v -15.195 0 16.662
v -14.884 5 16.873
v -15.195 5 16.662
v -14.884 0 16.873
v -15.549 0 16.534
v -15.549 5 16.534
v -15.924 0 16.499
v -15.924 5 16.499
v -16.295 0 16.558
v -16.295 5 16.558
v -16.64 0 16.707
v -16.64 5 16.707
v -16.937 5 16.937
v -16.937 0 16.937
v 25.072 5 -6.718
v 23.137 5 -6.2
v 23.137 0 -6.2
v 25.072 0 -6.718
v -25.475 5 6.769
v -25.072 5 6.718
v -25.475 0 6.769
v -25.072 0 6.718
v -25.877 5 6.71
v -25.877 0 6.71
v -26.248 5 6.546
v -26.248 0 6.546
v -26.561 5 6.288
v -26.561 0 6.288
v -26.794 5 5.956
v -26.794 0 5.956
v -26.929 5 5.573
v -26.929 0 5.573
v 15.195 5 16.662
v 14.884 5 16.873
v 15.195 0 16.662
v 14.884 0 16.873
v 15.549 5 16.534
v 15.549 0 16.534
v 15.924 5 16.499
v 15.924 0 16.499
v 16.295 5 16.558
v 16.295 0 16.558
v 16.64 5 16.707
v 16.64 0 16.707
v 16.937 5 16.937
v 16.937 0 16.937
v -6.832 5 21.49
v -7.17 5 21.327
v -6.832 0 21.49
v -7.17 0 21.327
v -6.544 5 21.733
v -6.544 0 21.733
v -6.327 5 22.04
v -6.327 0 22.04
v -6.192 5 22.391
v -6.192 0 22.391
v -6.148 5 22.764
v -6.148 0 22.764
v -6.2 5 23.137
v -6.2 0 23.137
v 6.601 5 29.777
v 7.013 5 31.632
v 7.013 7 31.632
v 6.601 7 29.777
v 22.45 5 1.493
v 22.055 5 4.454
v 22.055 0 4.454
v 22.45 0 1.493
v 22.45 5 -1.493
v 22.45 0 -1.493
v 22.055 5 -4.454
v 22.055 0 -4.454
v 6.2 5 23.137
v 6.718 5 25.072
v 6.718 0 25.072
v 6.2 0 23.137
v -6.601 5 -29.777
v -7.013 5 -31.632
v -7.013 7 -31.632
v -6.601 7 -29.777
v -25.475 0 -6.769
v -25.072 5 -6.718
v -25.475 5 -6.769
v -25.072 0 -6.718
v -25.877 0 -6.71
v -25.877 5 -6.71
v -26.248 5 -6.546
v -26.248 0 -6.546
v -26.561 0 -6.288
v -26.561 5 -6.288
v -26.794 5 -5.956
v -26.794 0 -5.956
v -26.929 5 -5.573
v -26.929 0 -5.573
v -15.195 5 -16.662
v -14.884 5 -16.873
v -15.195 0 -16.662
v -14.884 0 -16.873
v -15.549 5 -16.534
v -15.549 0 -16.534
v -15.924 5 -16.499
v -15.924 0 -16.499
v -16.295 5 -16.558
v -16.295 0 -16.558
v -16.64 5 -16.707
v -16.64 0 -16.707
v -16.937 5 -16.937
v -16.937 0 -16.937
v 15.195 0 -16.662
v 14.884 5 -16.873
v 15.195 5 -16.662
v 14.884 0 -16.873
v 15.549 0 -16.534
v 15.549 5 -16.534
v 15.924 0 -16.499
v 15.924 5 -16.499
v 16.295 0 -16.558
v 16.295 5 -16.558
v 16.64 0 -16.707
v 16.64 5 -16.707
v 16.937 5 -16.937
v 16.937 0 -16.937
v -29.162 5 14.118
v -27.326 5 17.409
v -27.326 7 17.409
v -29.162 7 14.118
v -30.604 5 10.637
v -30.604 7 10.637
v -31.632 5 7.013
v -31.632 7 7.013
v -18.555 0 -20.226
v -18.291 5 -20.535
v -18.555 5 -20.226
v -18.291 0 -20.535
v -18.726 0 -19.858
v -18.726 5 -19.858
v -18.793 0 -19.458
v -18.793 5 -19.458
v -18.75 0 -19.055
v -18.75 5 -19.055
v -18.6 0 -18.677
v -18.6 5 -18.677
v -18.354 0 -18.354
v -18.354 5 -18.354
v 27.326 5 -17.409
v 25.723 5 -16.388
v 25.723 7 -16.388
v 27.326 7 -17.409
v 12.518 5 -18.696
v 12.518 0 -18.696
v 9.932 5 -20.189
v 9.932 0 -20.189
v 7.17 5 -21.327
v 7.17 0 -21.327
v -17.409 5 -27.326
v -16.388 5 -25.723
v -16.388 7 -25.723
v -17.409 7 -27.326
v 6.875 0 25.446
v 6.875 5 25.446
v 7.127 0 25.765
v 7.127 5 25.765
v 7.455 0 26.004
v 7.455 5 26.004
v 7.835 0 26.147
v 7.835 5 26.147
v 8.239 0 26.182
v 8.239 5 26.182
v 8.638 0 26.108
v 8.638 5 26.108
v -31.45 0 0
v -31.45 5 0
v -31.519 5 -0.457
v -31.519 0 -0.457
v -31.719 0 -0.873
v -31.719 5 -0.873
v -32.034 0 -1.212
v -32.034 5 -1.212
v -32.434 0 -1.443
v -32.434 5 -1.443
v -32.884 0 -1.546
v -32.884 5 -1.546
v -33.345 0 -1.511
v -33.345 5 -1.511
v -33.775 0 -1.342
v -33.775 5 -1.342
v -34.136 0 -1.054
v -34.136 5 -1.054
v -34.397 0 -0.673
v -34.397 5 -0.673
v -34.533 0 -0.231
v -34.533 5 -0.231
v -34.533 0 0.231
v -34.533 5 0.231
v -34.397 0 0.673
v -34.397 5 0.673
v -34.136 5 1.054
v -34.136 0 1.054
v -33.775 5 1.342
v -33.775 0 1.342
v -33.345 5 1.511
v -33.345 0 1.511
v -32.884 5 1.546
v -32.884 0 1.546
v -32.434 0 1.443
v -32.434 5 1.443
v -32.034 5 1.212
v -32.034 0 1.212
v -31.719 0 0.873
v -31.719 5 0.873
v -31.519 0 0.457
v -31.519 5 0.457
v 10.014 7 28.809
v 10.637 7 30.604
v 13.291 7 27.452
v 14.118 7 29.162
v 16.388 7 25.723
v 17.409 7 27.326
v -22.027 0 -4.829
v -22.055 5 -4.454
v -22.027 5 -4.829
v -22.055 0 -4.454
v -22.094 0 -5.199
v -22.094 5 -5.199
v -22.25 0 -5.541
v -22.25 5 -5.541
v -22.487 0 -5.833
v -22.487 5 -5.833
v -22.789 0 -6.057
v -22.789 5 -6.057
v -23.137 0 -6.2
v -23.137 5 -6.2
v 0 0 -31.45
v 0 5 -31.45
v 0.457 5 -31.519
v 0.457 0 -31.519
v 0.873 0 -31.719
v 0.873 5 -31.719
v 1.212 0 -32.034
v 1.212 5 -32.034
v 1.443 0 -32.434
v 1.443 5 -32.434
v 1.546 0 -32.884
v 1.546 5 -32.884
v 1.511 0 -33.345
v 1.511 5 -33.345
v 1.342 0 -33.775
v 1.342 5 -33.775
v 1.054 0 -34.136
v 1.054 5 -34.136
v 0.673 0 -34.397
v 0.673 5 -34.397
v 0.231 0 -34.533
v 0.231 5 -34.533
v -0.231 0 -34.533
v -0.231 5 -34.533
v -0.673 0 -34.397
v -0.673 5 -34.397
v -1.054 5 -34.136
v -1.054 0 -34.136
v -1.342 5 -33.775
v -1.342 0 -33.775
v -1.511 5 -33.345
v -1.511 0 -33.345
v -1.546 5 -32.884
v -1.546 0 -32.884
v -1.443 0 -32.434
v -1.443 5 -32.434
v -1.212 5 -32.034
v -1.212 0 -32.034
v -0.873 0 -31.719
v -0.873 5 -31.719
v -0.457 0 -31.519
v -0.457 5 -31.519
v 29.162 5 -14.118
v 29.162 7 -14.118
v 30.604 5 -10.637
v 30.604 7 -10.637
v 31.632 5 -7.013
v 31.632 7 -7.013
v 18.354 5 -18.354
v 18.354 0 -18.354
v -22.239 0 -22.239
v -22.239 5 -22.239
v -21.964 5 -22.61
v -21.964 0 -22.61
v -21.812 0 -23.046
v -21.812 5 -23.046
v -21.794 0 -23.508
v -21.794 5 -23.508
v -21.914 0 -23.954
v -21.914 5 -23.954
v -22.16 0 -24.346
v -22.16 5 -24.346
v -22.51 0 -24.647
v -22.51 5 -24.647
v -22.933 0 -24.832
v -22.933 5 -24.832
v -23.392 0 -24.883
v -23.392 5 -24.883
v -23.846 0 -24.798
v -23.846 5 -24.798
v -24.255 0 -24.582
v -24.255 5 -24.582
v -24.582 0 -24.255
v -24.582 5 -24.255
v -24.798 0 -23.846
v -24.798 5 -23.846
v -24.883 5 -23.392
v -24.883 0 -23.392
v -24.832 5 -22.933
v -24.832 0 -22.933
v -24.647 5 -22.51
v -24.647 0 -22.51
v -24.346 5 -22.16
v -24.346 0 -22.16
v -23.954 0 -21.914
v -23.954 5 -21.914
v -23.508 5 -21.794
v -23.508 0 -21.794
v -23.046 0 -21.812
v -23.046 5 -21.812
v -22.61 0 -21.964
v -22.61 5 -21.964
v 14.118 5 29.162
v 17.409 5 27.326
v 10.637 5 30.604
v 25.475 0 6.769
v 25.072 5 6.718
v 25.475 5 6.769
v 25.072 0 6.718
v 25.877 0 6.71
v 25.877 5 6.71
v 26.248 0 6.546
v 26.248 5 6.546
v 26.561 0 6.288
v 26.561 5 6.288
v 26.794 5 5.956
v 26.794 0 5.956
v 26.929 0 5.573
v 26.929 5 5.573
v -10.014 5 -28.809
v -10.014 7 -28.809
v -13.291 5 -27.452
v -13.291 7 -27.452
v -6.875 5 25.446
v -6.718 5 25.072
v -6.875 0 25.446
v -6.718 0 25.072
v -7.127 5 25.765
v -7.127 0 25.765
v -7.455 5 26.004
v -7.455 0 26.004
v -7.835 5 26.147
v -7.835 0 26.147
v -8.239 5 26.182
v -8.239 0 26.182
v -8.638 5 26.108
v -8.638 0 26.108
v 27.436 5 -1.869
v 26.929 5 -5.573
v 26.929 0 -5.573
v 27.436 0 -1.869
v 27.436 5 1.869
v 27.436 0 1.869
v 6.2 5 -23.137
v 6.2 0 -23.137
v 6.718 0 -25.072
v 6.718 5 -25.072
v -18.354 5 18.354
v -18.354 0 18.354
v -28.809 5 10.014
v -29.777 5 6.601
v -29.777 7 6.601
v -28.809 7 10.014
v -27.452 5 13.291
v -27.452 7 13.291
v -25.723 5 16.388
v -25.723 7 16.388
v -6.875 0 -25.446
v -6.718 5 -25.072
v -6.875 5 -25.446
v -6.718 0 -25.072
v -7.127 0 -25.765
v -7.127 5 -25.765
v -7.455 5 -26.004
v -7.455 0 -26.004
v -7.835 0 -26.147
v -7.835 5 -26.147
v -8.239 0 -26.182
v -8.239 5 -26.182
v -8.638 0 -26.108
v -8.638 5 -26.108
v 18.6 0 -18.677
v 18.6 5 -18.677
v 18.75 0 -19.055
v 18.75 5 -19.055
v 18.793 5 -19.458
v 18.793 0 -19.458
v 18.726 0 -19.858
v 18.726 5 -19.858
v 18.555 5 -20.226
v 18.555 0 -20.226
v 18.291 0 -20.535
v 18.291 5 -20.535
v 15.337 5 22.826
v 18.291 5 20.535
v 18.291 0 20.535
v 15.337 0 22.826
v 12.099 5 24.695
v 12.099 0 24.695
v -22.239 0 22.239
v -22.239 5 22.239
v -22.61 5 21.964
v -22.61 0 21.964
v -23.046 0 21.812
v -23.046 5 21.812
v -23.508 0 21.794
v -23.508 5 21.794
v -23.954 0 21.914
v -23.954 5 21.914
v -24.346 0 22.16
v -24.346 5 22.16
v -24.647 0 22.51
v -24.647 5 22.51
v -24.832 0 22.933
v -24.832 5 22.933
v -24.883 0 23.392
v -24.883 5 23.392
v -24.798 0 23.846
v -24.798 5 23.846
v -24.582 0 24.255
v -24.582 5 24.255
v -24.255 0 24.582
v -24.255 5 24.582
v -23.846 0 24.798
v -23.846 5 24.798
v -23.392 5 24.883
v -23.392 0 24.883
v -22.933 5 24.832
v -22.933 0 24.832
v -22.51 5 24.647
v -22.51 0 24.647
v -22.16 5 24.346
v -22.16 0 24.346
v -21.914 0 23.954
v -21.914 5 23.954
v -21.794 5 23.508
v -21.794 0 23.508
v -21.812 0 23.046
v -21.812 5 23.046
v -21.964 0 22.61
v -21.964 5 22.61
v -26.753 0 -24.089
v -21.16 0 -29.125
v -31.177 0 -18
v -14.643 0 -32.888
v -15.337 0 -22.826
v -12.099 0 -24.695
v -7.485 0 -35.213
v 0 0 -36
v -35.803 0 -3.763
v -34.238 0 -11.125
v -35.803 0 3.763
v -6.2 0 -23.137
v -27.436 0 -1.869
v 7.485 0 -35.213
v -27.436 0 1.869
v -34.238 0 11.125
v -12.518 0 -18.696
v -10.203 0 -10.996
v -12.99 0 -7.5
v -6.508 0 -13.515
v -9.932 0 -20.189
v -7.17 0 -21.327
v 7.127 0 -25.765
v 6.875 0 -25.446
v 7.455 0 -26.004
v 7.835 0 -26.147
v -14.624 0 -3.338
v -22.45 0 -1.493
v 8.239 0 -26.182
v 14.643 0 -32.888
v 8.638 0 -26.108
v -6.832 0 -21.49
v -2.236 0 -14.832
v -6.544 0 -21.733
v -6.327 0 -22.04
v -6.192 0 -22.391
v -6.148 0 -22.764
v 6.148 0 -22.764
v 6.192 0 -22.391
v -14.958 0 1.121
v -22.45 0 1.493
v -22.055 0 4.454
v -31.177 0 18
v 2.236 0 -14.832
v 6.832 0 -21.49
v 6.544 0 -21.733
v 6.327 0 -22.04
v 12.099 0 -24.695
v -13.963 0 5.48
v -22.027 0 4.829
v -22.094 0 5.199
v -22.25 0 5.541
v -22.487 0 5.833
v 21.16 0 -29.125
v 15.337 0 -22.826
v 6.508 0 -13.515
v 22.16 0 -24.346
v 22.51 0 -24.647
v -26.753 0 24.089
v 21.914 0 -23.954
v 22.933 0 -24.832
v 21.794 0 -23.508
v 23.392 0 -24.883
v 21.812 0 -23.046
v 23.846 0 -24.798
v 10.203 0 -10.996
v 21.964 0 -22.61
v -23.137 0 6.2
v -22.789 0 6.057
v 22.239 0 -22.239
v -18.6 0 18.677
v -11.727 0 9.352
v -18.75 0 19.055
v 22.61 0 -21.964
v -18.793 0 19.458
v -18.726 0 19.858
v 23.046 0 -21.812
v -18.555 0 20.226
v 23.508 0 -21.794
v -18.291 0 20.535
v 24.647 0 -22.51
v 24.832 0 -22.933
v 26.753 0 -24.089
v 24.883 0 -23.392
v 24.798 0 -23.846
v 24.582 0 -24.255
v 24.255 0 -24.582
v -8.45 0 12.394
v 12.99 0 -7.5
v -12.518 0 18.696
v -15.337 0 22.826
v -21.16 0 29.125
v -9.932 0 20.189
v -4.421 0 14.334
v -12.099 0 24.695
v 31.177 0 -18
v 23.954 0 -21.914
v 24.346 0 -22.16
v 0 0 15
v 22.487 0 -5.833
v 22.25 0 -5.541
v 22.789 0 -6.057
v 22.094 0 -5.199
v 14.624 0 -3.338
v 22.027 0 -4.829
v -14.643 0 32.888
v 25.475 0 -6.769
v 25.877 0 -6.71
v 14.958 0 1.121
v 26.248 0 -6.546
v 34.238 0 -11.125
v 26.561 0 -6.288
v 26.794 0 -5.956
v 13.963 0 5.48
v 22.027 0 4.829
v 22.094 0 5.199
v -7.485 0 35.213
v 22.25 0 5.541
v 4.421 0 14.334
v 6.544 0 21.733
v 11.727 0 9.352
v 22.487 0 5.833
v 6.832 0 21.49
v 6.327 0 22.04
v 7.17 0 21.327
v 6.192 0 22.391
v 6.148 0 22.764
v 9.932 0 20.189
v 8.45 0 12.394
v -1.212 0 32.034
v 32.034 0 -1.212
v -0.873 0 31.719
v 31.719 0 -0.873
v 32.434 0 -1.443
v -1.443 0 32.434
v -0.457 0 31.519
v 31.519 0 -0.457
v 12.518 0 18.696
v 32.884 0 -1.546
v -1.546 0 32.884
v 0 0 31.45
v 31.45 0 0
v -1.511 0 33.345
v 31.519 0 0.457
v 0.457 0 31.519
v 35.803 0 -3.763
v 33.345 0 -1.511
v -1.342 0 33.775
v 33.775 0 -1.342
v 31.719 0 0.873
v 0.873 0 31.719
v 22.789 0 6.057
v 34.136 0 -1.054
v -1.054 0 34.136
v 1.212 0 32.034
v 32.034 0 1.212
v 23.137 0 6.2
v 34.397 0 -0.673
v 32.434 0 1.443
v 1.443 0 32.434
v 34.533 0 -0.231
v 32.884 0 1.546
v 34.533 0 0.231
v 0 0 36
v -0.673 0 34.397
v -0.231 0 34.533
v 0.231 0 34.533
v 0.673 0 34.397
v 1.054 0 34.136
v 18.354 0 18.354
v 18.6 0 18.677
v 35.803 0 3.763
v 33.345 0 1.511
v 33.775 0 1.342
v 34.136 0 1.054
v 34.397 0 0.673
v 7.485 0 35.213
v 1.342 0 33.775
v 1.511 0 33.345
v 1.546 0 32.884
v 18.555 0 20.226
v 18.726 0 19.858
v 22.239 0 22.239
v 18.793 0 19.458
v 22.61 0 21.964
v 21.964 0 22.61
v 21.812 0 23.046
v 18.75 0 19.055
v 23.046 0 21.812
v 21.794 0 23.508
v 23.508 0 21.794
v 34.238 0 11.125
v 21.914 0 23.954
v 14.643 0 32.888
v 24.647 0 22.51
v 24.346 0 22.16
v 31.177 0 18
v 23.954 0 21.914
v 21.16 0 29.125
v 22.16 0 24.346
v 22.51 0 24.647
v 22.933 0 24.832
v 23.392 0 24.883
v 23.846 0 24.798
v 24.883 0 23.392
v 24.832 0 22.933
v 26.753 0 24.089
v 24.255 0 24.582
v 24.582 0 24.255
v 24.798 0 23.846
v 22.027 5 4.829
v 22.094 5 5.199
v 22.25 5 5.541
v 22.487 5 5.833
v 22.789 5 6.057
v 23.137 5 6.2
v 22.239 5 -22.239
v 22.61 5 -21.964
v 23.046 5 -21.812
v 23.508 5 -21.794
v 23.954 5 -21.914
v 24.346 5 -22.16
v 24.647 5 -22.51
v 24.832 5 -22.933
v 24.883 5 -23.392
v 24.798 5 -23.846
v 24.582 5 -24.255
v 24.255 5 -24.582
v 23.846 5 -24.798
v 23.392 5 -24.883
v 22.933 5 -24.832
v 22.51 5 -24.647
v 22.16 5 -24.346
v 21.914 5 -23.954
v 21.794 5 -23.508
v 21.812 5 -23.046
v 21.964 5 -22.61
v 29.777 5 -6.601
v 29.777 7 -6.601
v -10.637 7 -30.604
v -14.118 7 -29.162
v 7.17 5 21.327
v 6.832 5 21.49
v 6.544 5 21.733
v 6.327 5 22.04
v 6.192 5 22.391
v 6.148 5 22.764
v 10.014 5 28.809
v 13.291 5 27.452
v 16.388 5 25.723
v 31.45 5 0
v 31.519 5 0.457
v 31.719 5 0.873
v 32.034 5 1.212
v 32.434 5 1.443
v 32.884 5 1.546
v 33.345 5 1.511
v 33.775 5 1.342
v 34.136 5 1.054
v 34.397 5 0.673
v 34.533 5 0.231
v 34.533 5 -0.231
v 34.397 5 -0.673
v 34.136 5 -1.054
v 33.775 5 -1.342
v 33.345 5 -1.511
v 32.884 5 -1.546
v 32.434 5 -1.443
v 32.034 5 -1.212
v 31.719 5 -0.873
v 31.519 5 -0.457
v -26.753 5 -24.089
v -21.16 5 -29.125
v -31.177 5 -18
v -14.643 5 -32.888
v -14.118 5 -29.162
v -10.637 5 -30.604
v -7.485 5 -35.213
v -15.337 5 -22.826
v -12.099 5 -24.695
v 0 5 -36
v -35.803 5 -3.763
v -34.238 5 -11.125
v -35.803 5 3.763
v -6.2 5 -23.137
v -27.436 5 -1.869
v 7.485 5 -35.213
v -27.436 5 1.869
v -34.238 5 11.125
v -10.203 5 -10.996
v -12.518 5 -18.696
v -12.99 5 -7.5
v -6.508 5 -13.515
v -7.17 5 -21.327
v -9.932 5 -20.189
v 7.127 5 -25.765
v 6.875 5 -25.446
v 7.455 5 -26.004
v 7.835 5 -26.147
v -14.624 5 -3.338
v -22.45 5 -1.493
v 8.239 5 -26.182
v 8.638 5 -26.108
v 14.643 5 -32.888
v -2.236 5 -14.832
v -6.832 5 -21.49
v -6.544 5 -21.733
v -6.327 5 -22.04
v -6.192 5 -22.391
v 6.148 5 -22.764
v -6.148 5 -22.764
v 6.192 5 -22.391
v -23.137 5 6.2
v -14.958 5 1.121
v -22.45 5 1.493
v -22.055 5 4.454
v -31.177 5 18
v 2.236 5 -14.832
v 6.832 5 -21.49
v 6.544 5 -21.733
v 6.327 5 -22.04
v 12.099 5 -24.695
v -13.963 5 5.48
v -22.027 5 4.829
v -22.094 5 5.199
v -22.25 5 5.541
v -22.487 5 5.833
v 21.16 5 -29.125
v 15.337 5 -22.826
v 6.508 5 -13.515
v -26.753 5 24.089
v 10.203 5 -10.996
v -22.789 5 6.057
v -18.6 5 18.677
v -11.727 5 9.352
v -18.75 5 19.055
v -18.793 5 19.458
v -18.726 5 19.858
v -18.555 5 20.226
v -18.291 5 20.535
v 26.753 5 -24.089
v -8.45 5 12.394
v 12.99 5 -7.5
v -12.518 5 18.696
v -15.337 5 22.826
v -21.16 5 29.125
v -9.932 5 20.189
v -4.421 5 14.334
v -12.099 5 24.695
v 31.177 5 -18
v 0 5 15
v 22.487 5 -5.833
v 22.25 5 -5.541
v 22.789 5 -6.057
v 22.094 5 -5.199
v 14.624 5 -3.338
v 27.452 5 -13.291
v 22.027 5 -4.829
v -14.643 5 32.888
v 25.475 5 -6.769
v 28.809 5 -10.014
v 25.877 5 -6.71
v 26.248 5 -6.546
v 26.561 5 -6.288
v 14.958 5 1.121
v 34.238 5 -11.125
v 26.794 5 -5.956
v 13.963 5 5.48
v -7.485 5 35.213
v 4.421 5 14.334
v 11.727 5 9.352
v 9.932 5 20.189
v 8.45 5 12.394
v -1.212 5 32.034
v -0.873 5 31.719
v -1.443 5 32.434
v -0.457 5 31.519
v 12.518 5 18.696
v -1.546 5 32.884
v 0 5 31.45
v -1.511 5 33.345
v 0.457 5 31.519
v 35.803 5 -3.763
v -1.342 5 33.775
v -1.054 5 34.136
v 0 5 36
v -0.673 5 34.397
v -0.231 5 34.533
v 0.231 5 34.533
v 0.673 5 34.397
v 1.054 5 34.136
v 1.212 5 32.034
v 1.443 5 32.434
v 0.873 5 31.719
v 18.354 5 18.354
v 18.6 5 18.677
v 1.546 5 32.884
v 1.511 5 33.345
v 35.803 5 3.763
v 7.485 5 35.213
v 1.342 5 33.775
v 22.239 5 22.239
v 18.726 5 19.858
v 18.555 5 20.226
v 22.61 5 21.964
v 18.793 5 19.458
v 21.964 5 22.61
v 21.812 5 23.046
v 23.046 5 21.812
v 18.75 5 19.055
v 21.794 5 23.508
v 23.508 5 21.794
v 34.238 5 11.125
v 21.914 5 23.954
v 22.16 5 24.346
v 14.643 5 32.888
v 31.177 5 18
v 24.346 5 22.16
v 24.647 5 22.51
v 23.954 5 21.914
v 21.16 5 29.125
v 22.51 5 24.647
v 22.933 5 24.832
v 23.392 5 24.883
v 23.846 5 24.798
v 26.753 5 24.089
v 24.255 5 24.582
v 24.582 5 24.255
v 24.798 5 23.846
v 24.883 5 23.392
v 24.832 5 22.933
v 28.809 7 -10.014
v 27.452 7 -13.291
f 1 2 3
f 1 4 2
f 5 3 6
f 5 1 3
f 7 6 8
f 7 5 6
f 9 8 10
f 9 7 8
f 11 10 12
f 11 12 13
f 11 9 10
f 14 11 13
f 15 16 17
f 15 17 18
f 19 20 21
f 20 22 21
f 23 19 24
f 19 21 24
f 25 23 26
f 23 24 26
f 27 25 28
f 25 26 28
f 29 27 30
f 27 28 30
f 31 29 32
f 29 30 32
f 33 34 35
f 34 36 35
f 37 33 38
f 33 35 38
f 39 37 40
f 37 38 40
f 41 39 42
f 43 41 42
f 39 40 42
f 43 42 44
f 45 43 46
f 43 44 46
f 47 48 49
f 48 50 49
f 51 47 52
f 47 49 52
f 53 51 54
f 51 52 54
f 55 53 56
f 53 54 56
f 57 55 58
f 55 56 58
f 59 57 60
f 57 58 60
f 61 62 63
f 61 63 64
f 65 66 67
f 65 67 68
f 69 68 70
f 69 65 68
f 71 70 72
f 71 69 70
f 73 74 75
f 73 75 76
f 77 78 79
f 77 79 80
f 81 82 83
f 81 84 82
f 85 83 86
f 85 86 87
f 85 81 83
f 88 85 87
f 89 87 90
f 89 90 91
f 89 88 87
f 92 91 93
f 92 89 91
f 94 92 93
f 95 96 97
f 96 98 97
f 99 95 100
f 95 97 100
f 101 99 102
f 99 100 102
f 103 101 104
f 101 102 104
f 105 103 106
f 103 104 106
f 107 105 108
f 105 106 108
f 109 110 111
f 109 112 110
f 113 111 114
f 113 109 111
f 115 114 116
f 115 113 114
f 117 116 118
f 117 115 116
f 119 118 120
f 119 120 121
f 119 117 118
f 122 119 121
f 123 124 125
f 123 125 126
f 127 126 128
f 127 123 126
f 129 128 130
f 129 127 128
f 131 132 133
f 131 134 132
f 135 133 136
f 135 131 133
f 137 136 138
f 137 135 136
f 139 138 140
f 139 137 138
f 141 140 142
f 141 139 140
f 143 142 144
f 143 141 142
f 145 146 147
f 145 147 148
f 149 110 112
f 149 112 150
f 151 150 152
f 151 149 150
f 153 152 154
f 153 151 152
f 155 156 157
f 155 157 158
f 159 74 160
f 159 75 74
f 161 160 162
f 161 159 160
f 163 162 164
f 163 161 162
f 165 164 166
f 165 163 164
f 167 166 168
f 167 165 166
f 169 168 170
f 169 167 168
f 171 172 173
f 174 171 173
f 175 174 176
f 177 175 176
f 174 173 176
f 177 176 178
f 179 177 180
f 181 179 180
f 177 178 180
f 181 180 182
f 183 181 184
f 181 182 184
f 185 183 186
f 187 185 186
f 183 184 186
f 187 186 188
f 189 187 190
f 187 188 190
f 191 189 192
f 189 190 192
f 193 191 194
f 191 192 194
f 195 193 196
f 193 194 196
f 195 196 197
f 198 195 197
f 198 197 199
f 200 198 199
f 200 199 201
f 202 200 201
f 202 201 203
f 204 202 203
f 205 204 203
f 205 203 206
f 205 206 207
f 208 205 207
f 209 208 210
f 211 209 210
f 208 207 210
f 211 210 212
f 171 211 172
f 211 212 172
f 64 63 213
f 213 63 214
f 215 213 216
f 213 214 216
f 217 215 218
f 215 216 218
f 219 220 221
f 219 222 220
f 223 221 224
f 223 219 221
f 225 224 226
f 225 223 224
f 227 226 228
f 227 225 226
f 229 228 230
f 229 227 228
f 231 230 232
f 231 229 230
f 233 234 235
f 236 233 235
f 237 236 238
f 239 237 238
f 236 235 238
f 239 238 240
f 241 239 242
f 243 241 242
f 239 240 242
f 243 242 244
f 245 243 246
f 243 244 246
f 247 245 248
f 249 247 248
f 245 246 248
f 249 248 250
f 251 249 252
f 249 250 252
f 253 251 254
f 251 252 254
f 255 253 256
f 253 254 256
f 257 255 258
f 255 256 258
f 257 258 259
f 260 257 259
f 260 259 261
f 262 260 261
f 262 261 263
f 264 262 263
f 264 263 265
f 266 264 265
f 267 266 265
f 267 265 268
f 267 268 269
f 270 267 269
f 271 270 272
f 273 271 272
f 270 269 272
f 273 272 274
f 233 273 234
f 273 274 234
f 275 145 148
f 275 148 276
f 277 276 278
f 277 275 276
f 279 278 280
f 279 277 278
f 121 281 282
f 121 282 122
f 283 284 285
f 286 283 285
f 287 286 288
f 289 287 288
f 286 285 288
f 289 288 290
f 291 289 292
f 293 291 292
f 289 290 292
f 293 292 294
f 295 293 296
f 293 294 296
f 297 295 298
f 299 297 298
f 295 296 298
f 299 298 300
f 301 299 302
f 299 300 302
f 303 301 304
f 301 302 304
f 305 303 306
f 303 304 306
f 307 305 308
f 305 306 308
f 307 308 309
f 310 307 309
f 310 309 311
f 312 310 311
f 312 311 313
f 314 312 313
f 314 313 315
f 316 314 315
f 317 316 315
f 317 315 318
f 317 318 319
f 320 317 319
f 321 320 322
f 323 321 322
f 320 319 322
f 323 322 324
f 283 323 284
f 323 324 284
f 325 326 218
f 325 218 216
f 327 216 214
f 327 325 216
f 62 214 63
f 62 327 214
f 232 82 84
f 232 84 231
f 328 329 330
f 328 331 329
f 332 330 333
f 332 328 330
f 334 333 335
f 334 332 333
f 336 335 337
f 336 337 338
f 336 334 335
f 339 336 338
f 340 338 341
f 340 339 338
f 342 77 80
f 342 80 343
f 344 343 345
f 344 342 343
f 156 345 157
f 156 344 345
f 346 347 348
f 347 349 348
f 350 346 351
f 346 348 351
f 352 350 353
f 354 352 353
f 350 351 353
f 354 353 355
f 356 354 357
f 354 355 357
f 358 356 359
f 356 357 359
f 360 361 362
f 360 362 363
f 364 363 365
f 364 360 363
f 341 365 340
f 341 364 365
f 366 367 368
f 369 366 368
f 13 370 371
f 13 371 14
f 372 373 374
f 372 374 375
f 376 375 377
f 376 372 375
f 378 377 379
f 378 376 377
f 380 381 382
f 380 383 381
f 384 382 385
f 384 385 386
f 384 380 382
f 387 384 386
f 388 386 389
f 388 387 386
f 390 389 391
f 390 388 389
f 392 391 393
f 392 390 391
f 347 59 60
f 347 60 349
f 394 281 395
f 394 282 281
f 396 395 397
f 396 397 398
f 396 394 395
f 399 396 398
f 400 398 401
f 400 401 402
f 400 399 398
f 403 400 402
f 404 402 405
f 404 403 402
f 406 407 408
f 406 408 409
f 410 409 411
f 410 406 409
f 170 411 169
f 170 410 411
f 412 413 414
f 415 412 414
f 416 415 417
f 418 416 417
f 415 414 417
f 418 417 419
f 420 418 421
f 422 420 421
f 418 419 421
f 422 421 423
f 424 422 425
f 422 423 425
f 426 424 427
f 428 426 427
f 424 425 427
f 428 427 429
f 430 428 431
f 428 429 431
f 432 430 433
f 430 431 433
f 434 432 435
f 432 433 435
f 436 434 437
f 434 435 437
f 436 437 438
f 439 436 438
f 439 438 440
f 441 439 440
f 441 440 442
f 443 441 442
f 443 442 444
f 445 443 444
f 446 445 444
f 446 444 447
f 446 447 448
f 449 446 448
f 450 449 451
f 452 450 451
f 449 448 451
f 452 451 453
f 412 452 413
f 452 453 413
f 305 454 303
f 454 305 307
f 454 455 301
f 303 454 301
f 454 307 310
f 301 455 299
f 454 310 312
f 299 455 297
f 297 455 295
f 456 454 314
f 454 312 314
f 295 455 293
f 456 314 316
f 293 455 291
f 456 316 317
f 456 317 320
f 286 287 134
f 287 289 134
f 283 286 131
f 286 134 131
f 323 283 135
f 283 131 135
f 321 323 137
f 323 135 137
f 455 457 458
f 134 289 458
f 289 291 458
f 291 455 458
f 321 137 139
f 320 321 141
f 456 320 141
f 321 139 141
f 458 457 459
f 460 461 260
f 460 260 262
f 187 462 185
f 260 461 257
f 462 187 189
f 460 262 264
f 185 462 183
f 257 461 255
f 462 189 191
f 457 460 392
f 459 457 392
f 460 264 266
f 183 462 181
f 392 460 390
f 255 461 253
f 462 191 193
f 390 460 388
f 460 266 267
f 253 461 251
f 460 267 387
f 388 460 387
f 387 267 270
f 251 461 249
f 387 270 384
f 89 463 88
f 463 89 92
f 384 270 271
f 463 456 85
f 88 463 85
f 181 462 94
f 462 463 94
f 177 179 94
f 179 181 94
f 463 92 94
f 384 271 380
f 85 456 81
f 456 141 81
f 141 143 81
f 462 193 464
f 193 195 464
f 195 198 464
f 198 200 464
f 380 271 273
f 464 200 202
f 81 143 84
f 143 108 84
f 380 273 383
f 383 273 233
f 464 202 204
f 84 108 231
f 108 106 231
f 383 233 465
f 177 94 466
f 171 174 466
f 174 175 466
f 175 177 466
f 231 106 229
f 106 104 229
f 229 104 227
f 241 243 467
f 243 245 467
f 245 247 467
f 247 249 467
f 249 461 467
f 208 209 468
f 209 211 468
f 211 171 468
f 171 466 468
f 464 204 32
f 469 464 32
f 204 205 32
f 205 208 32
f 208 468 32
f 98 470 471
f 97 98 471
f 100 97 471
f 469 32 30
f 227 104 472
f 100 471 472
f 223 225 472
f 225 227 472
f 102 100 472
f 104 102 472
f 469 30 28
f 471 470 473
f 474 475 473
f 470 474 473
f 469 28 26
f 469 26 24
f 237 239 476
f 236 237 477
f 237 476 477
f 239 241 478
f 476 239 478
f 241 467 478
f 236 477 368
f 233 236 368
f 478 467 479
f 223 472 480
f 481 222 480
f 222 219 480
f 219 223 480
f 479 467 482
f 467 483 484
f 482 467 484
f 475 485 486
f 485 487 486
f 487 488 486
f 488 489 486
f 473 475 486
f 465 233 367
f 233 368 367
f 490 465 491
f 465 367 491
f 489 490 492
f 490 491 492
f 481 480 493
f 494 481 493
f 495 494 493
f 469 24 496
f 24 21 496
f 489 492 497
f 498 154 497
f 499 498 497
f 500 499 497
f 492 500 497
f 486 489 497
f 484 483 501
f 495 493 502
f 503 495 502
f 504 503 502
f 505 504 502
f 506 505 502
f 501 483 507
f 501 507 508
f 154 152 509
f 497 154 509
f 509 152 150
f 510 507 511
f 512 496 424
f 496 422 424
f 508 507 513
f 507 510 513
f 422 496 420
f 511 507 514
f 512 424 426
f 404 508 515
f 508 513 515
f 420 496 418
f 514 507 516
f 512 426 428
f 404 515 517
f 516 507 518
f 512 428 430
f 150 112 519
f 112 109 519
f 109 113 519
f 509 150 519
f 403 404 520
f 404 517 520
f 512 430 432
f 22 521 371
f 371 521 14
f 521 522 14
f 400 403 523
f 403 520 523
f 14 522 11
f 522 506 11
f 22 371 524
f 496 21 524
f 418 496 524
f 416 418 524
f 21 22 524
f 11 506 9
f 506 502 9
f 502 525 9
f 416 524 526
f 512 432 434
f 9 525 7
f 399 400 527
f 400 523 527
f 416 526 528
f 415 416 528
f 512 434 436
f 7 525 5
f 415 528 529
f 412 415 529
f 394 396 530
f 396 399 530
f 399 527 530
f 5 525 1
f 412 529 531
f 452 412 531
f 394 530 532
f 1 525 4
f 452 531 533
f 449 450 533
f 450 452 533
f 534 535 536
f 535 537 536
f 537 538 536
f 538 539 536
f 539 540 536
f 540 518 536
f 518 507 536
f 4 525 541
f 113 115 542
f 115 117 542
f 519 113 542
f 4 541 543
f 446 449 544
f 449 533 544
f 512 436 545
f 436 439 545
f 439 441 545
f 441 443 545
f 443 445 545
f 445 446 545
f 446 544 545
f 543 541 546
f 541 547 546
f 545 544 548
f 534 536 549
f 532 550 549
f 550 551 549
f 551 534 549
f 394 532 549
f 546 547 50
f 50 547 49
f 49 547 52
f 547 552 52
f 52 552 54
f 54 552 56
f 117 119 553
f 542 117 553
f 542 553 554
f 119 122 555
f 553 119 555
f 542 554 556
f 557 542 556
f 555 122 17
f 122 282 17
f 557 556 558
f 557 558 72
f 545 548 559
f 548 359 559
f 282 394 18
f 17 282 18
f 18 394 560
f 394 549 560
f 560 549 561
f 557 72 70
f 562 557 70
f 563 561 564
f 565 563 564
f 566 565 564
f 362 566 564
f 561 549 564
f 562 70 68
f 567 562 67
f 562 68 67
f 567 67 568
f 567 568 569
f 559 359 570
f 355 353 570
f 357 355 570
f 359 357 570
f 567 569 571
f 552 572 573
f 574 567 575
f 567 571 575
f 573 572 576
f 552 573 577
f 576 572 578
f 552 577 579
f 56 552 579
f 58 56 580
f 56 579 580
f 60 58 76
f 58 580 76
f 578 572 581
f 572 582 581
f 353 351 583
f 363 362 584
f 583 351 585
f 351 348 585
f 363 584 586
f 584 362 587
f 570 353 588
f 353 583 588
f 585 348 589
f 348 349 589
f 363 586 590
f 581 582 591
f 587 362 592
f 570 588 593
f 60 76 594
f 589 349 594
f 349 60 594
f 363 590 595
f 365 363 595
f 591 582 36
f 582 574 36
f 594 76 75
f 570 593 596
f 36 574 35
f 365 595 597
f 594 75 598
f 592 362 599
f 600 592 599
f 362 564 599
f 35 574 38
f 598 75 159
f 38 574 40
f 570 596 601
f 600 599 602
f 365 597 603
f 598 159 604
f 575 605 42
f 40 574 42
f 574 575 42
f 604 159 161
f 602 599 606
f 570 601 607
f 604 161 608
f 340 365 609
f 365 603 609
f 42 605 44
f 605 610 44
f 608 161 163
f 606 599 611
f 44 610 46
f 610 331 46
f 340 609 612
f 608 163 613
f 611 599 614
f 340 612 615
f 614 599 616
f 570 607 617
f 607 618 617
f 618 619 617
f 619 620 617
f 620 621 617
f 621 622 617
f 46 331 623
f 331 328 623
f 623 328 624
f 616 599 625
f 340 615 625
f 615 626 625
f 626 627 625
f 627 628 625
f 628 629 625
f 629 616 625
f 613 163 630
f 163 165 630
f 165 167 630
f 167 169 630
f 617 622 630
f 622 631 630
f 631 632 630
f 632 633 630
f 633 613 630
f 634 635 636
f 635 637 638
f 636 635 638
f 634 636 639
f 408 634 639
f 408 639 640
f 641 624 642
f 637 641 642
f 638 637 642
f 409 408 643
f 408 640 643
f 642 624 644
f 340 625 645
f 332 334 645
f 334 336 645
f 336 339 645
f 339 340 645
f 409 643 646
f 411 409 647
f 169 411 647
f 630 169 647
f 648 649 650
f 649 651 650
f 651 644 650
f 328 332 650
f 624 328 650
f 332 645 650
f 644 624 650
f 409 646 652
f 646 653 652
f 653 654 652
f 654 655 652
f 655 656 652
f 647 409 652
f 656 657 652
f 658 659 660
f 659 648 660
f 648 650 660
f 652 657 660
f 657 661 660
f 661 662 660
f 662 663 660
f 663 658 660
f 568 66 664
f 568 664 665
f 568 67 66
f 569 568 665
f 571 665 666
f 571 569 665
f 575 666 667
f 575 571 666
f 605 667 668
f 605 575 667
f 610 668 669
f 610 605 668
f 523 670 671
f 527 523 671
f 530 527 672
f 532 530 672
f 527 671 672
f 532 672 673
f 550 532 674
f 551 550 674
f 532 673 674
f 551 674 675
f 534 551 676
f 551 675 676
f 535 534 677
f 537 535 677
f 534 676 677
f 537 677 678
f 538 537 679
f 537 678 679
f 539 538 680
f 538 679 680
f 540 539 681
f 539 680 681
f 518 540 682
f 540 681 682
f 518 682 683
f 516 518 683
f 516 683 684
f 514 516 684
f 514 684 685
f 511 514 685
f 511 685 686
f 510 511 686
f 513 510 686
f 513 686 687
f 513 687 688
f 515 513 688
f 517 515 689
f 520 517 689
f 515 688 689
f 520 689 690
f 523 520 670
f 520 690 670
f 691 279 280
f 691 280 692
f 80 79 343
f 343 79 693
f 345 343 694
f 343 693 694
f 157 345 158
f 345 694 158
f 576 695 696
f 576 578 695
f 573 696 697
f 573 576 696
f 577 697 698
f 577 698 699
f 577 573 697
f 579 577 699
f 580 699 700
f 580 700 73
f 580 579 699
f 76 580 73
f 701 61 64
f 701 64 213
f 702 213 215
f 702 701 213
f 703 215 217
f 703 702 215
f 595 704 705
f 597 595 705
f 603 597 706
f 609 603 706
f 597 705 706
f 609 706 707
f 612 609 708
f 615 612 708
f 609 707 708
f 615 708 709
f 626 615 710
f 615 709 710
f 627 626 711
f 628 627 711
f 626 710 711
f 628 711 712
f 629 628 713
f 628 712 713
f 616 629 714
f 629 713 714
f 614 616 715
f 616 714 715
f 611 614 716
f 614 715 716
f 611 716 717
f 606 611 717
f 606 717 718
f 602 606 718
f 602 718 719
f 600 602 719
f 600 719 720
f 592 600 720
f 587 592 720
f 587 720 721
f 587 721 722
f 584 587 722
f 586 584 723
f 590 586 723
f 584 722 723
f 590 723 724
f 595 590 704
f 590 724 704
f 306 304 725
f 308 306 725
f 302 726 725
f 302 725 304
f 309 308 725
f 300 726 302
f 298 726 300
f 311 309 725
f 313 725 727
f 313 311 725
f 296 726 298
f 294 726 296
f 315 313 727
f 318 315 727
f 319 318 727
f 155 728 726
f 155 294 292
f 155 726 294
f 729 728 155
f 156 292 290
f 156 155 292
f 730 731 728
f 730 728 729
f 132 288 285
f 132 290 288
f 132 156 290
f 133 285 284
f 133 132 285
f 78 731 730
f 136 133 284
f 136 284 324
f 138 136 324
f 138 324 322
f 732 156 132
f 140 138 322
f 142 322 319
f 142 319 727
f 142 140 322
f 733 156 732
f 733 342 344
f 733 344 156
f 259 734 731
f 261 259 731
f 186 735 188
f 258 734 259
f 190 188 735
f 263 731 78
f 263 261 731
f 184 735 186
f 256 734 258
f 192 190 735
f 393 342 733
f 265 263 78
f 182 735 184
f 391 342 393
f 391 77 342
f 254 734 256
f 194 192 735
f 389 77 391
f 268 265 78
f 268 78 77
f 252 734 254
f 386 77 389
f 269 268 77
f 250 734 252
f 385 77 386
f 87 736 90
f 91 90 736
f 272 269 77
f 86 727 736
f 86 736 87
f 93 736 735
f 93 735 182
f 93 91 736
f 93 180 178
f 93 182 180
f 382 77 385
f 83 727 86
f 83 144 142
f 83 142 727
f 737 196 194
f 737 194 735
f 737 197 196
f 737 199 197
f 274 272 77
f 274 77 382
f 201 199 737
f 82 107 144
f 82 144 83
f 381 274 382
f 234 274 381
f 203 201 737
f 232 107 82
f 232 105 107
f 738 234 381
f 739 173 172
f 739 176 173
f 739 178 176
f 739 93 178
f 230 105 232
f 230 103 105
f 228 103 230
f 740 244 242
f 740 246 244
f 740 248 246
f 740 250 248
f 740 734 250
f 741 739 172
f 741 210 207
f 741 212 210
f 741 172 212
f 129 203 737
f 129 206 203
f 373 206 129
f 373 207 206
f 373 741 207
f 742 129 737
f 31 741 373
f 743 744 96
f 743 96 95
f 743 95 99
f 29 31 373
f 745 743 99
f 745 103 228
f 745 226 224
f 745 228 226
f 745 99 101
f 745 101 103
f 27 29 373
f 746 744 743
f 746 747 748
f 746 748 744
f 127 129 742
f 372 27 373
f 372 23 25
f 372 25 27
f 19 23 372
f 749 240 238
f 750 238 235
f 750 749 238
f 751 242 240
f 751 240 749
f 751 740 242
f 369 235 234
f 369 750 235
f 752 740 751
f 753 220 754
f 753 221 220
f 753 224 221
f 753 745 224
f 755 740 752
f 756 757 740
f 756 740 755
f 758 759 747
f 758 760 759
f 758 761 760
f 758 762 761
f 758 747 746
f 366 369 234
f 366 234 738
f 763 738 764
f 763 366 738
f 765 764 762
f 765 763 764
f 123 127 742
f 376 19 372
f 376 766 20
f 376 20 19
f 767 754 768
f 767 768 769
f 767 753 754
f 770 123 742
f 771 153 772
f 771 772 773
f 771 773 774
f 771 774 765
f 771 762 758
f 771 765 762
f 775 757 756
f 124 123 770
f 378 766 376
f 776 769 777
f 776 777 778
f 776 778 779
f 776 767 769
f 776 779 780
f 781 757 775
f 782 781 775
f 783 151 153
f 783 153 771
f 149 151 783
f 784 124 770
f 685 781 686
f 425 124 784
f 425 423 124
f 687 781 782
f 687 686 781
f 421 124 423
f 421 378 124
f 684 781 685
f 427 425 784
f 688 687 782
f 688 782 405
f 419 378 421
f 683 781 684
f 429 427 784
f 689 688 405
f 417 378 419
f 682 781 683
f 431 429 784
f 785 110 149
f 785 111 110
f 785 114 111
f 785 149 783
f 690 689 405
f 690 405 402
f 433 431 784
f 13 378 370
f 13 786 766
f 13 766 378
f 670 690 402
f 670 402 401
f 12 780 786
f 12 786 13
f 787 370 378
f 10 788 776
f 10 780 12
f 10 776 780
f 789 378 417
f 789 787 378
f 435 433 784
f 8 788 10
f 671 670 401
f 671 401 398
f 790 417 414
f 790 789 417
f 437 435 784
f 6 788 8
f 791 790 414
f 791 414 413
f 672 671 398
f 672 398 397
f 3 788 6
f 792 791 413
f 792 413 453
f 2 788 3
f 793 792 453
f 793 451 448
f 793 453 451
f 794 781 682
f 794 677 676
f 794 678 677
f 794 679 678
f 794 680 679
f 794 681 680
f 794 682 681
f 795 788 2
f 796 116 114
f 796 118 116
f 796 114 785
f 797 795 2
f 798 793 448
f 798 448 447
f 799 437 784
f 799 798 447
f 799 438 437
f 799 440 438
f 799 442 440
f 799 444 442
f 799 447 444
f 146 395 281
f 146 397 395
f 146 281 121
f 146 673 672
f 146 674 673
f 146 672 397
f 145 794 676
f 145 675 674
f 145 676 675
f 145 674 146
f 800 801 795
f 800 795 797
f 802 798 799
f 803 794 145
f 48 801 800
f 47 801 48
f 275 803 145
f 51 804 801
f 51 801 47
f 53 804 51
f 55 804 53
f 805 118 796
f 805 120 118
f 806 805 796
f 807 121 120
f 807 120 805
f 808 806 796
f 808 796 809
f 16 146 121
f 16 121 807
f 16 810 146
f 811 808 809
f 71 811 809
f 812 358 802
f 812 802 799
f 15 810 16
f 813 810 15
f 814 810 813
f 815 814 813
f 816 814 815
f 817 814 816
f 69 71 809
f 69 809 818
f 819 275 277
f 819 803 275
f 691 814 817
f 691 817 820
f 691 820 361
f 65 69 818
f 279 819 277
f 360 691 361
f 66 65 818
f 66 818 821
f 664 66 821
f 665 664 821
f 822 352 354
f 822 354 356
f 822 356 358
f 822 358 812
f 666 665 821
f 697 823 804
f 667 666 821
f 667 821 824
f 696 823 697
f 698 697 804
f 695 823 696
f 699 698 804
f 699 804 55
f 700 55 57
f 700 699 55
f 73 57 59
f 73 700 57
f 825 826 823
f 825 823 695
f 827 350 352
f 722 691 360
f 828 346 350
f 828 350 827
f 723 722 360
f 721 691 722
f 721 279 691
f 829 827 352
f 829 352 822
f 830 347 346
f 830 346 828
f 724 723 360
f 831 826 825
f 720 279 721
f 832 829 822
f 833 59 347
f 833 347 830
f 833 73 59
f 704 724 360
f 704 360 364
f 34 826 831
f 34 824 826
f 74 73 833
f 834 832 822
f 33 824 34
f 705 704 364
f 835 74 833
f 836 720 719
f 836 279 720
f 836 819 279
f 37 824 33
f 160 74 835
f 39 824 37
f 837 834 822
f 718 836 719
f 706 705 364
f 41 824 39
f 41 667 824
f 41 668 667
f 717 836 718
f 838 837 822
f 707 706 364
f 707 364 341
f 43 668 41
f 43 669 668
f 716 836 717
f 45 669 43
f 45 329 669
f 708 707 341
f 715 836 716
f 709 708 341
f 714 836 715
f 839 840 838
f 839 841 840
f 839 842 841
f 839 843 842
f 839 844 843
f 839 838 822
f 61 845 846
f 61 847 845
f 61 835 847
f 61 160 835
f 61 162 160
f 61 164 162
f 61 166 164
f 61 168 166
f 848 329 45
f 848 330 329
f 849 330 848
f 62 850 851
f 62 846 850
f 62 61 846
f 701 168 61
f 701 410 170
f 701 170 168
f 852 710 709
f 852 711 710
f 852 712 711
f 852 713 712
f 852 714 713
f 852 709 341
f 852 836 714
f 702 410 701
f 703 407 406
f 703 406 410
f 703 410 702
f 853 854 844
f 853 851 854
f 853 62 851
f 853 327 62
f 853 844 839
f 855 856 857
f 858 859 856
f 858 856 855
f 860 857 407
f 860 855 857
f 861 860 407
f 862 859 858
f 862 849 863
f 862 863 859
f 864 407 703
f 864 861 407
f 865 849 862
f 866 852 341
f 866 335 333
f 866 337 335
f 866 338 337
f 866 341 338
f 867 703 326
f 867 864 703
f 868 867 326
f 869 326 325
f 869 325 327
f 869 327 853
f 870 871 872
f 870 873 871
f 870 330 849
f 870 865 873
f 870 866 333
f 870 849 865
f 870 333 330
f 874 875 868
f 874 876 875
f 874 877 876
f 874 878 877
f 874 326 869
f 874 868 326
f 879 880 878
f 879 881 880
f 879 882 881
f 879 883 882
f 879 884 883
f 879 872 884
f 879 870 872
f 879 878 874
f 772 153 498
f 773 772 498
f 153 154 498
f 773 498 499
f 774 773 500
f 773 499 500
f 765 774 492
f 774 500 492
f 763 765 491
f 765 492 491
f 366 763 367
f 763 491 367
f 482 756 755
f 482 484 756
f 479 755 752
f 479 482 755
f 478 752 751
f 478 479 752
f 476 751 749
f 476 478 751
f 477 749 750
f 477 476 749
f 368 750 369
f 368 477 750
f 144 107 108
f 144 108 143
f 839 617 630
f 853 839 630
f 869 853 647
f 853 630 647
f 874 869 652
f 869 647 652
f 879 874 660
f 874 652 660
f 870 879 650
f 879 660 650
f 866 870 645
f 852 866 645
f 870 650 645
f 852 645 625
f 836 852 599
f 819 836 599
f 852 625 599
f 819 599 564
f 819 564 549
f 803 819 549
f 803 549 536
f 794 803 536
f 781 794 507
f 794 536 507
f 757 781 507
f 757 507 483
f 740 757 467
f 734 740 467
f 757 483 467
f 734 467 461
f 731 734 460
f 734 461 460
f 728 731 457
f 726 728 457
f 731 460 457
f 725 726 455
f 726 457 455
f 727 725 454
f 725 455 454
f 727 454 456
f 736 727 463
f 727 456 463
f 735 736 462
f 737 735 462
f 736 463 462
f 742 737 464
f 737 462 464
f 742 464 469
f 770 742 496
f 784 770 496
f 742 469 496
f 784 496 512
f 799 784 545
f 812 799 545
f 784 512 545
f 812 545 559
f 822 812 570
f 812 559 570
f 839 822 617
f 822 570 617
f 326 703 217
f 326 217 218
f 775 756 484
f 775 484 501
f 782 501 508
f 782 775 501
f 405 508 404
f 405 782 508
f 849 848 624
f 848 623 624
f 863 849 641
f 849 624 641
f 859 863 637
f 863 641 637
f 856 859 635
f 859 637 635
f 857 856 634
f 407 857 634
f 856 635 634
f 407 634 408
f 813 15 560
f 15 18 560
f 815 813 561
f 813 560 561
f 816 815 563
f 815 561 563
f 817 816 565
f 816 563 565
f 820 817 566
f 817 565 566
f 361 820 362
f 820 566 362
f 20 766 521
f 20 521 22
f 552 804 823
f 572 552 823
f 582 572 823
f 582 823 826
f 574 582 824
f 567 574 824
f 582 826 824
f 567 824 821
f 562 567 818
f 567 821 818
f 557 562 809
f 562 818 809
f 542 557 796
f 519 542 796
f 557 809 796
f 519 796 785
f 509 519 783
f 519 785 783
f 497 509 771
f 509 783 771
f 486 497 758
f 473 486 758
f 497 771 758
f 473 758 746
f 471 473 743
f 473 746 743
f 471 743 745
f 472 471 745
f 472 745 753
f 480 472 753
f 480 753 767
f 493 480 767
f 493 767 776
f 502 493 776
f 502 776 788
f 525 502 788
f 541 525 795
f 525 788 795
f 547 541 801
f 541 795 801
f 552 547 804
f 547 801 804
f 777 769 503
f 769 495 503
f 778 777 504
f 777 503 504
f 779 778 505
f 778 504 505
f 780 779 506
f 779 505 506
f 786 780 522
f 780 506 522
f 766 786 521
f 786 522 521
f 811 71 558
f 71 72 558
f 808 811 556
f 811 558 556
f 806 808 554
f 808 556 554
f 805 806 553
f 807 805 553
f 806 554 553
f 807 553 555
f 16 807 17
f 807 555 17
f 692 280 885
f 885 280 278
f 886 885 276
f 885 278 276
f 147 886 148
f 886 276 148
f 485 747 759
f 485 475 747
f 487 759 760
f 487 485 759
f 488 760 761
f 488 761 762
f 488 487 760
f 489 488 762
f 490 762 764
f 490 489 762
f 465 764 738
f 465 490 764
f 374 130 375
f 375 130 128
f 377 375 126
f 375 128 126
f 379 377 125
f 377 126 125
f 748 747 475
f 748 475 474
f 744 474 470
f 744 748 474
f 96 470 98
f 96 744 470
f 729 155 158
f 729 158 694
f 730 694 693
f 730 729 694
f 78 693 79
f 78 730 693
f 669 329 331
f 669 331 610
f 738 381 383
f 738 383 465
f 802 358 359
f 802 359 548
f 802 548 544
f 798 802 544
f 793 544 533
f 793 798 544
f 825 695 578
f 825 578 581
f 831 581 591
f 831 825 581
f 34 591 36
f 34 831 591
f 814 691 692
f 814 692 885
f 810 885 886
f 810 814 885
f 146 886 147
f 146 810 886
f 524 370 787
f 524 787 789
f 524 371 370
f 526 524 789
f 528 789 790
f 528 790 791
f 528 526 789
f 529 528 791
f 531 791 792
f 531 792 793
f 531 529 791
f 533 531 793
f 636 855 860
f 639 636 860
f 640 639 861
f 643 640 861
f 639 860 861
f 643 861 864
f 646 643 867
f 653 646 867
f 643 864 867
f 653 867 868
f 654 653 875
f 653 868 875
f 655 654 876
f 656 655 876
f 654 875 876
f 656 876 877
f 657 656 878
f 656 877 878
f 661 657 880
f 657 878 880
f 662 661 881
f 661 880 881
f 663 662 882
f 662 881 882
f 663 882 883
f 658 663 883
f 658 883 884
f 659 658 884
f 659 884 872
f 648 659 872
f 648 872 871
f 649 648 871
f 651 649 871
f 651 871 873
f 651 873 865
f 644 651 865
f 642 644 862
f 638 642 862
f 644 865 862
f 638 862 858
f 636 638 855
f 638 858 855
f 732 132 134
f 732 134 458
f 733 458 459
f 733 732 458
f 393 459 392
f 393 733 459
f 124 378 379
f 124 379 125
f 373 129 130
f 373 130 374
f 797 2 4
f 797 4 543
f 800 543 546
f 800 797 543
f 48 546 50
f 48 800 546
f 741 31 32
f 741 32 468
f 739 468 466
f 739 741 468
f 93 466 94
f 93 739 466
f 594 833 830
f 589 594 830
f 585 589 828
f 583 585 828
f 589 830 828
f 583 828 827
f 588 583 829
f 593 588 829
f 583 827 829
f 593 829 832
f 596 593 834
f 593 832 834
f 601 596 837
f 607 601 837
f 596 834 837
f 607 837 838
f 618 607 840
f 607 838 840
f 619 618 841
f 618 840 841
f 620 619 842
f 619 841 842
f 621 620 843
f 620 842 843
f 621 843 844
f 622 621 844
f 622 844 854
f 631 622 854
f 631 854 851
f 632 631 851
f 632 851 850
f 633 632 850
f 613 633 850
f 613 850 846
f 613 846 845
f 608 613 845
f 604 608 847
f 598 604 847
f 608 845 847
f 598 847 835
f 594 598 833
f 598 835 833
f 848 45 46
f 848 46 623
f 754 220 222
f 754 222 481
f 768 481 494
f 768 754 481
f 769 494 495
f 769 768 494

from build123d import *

# Parameters (mm, degrees)
SKETCH1_R                = 36
BOSS_EXTRUDE1_DEPTH      = 5
SKETCH2_R                = 15
CUT_EXTRUDE1_DEPTH       = 5
CUT_EXTRUDE3_DEPTH       = 5
FILLET1_R                = 1.5
CIRPATTERN1_COUNT        = 6
FILLET1_OF_CIRPATTERN1_R = 1.5
SKETCH4_R                = 1.55
CUT_EXTRUDE4_DEPTH       = 5
CIRPATTERN2_COUNT        = 8
BOSS_EXTRUDE2_DEPTH      = 2
CIRPATTERN3_COUNT        = 4


with BuildPart() as part:
    # Sketch1 → Boss-Extrude1 (new body)
    with BuildSketch(Plane(origin=(0, 0, 0), x_dir=(1, 0, 0), z_dir=(0, 1, 0))):
        with Locations(Location((0, 0, 0), (0, 0, 270))):
            Circle(SKETCH1_R)
    extrude(amount=BOSS_EXTRUDE1_DEPTH)

    # Sketch2 → Cut-Extrude1 (cut)
    with BuildSketch(Plane(origin=(0, 5, 0), x_dir=(1, 0, 0), z_dir=(0, 1, 0))):
        with Locations(Location((0, 0, 0), (0, 0, 270))):
            Circle(SKETCH2_R)
    extrude(amount=-CUT_EXTRUDE1_DEPTH, mode=Mode.SUBTRACT)

    # Sketch3 → Cut-Extrude3 (cut)
    with BuildSketch(Plane(origin=(0, 5, 0), x_dir=(1, 0, 0), z_dir=(0, 1, 0))):
        with BuildLine():
            Line((-15.909902577, 15.909902577), (-19.445436483, 19.445436483))
            ThreePointArc((-19.445436483, 19.445436483), (-13.75, 23.815698604), (-7.11752374, 26.562960223))
            Line((-7.11752374, 26.562960223), (-5.823428515, 21.733331092))
            ThreePointArc((-5.823428515, 21.733331092), (-11.25, 19.485571585), (-15.909902577, 15.909902577))
        make_face()
    cut_extrude3 = extrude(amount=-CUT_EXTRUDE3_DEPTH, mode=Mode.SUBTRACT)

    # Fillet1
    fillet1_edges = [part.edges().sort_by_distance(p)[0] for p in [
        (-19.445436483, 2.5, -19.445436483),
        (-7.11752374, 2.5, -26.562960223),
        (-5.823428515, 2.5, -21.733331092),
        (-15.909902577, 2.5, -15.909902577),
    ]]
    fillet(fillet1_edges, radius=FILLET1_R)

    # CirPattern1: Cut-Extrude3 ×6 about axis
    cirpattern1_axis = Axis((0, 0, 0), (0, 1, 0))
    for i in range(1, CIRPATTERN1_COUNT):
        add(cut_extrude3.rotate(cirpattern1_axis, i * 360 / CIRPATTERN1_COUNT), mode=Mode.SUBTRACT)

    # Fillet1 of CirPattern1
    fillet1_of_cirpattern1_edges = [part.edges().sort_by_distance(p)[0] for p in [
        (-26.562960223, 2.5, 7.11752374),
        (-26.562960223, 2.5, -7.11752374),
        (-21.733331092, 2.5, -5.823428515),
        (-21.733331092, 2.5, 5.823428515),
        (-7.11752374, 2.5, 26.562960223),
        (-19.445436483, 2.5, 19.445436483),
        (-15.909902577, 2.5, 15.909902577),
        (-5.823428515, 2.5, 21.733331092),
        (19.445436483, 2.5, 19.445436483),
        (7.11752374, 2.5, 26.562960223),
        (5.823428515, 2.5, 21.733331092),
        (15.909902577, 2.5, 15.909902577),
        (26.562960223, 2.5, -7.11752374),
        (26.562960223, 2.5, 7.11752374),
        (21.733331092, 2.5, 5.823428515),
        (21.733331092, 2.5, -5.823428515),
        (7.11752374, 2.5, -26.562960223),
        (19.445436483, 2.5, -19.445436483),
        (15.909902577, 2.5, -15.909902577),
        (5.823428515, 2.5, -21.733331092),
    ]]
    fillet(fillet1_of_cirpattern1_edges, radius=FILLET1_OF_CIRPATTERN1_R)

    # Sketch4 → Cut-Extrude4 (cut)
    with BuildSketch(Plane(origin=(0, 5, 0), x_dir=(1, 0, 0), z_dir=(0, 1, 0))):
        with Locations(Location((0, 33, 0), (0, 0, 270))):
            Circle(SKETCH4_R)
    cut_extrude4 = extrude(amount=-CUT_EXTRUDE4_DEPTH, mode=Mode.SUBTRACT)

    # CirPattern2: Cut-Extrude4 ×8 about axis
    cirpattern2_axis = Axis((0, 0, 0), (0, 1, 0))
    for i in range(1, CIRPATTERN2_COUNT):
        add(cut_extrude4.rotate(cirpattern2_axis, i * 360 / CIRPATTERN2_COUNT), mode=Mode.SUBTRACT)

    # Sketch6 → Boss-Extrude2 (add)
    with BuildSketch(Plane(origin=(0, 5, 0), x_dir=(1, 0, 0), z_dir=(0, 1, 0))):
        with BuildLine():
            Line((-16.387638055, 25.723439097), (-17.40850731, 27.325882844))
            ThreePointArc((-17.40850731, 27.325882844), (-12.398943209, 29.933696853), (-7.012643492, 31.631990631))
            Line((-7.012643492, 31.631990631), (-6.601408225, 29.777028217))
            ThreePointArc((-6.601408225, 29.777028217), (-11.671844687, 28.178325742), (-16.387638055, 25.723439097))
        make_face()
    boss_extrude2 = extrude(amount=BOSS_EXTRUDE2_DEPTH)

    # CirPattern3: Boss-Extrude2 ×4 about axis
    cirpattern3_axis = Axis((0, 5, 0), (0, -1, 0))
    for i in range(1, CIRPATTERN3_COUNT):
        add(boss_extrude2.rotate(cirpattern3_axis, i * 360 / CIRPATTERN3_COUNT))


solid = part.part
